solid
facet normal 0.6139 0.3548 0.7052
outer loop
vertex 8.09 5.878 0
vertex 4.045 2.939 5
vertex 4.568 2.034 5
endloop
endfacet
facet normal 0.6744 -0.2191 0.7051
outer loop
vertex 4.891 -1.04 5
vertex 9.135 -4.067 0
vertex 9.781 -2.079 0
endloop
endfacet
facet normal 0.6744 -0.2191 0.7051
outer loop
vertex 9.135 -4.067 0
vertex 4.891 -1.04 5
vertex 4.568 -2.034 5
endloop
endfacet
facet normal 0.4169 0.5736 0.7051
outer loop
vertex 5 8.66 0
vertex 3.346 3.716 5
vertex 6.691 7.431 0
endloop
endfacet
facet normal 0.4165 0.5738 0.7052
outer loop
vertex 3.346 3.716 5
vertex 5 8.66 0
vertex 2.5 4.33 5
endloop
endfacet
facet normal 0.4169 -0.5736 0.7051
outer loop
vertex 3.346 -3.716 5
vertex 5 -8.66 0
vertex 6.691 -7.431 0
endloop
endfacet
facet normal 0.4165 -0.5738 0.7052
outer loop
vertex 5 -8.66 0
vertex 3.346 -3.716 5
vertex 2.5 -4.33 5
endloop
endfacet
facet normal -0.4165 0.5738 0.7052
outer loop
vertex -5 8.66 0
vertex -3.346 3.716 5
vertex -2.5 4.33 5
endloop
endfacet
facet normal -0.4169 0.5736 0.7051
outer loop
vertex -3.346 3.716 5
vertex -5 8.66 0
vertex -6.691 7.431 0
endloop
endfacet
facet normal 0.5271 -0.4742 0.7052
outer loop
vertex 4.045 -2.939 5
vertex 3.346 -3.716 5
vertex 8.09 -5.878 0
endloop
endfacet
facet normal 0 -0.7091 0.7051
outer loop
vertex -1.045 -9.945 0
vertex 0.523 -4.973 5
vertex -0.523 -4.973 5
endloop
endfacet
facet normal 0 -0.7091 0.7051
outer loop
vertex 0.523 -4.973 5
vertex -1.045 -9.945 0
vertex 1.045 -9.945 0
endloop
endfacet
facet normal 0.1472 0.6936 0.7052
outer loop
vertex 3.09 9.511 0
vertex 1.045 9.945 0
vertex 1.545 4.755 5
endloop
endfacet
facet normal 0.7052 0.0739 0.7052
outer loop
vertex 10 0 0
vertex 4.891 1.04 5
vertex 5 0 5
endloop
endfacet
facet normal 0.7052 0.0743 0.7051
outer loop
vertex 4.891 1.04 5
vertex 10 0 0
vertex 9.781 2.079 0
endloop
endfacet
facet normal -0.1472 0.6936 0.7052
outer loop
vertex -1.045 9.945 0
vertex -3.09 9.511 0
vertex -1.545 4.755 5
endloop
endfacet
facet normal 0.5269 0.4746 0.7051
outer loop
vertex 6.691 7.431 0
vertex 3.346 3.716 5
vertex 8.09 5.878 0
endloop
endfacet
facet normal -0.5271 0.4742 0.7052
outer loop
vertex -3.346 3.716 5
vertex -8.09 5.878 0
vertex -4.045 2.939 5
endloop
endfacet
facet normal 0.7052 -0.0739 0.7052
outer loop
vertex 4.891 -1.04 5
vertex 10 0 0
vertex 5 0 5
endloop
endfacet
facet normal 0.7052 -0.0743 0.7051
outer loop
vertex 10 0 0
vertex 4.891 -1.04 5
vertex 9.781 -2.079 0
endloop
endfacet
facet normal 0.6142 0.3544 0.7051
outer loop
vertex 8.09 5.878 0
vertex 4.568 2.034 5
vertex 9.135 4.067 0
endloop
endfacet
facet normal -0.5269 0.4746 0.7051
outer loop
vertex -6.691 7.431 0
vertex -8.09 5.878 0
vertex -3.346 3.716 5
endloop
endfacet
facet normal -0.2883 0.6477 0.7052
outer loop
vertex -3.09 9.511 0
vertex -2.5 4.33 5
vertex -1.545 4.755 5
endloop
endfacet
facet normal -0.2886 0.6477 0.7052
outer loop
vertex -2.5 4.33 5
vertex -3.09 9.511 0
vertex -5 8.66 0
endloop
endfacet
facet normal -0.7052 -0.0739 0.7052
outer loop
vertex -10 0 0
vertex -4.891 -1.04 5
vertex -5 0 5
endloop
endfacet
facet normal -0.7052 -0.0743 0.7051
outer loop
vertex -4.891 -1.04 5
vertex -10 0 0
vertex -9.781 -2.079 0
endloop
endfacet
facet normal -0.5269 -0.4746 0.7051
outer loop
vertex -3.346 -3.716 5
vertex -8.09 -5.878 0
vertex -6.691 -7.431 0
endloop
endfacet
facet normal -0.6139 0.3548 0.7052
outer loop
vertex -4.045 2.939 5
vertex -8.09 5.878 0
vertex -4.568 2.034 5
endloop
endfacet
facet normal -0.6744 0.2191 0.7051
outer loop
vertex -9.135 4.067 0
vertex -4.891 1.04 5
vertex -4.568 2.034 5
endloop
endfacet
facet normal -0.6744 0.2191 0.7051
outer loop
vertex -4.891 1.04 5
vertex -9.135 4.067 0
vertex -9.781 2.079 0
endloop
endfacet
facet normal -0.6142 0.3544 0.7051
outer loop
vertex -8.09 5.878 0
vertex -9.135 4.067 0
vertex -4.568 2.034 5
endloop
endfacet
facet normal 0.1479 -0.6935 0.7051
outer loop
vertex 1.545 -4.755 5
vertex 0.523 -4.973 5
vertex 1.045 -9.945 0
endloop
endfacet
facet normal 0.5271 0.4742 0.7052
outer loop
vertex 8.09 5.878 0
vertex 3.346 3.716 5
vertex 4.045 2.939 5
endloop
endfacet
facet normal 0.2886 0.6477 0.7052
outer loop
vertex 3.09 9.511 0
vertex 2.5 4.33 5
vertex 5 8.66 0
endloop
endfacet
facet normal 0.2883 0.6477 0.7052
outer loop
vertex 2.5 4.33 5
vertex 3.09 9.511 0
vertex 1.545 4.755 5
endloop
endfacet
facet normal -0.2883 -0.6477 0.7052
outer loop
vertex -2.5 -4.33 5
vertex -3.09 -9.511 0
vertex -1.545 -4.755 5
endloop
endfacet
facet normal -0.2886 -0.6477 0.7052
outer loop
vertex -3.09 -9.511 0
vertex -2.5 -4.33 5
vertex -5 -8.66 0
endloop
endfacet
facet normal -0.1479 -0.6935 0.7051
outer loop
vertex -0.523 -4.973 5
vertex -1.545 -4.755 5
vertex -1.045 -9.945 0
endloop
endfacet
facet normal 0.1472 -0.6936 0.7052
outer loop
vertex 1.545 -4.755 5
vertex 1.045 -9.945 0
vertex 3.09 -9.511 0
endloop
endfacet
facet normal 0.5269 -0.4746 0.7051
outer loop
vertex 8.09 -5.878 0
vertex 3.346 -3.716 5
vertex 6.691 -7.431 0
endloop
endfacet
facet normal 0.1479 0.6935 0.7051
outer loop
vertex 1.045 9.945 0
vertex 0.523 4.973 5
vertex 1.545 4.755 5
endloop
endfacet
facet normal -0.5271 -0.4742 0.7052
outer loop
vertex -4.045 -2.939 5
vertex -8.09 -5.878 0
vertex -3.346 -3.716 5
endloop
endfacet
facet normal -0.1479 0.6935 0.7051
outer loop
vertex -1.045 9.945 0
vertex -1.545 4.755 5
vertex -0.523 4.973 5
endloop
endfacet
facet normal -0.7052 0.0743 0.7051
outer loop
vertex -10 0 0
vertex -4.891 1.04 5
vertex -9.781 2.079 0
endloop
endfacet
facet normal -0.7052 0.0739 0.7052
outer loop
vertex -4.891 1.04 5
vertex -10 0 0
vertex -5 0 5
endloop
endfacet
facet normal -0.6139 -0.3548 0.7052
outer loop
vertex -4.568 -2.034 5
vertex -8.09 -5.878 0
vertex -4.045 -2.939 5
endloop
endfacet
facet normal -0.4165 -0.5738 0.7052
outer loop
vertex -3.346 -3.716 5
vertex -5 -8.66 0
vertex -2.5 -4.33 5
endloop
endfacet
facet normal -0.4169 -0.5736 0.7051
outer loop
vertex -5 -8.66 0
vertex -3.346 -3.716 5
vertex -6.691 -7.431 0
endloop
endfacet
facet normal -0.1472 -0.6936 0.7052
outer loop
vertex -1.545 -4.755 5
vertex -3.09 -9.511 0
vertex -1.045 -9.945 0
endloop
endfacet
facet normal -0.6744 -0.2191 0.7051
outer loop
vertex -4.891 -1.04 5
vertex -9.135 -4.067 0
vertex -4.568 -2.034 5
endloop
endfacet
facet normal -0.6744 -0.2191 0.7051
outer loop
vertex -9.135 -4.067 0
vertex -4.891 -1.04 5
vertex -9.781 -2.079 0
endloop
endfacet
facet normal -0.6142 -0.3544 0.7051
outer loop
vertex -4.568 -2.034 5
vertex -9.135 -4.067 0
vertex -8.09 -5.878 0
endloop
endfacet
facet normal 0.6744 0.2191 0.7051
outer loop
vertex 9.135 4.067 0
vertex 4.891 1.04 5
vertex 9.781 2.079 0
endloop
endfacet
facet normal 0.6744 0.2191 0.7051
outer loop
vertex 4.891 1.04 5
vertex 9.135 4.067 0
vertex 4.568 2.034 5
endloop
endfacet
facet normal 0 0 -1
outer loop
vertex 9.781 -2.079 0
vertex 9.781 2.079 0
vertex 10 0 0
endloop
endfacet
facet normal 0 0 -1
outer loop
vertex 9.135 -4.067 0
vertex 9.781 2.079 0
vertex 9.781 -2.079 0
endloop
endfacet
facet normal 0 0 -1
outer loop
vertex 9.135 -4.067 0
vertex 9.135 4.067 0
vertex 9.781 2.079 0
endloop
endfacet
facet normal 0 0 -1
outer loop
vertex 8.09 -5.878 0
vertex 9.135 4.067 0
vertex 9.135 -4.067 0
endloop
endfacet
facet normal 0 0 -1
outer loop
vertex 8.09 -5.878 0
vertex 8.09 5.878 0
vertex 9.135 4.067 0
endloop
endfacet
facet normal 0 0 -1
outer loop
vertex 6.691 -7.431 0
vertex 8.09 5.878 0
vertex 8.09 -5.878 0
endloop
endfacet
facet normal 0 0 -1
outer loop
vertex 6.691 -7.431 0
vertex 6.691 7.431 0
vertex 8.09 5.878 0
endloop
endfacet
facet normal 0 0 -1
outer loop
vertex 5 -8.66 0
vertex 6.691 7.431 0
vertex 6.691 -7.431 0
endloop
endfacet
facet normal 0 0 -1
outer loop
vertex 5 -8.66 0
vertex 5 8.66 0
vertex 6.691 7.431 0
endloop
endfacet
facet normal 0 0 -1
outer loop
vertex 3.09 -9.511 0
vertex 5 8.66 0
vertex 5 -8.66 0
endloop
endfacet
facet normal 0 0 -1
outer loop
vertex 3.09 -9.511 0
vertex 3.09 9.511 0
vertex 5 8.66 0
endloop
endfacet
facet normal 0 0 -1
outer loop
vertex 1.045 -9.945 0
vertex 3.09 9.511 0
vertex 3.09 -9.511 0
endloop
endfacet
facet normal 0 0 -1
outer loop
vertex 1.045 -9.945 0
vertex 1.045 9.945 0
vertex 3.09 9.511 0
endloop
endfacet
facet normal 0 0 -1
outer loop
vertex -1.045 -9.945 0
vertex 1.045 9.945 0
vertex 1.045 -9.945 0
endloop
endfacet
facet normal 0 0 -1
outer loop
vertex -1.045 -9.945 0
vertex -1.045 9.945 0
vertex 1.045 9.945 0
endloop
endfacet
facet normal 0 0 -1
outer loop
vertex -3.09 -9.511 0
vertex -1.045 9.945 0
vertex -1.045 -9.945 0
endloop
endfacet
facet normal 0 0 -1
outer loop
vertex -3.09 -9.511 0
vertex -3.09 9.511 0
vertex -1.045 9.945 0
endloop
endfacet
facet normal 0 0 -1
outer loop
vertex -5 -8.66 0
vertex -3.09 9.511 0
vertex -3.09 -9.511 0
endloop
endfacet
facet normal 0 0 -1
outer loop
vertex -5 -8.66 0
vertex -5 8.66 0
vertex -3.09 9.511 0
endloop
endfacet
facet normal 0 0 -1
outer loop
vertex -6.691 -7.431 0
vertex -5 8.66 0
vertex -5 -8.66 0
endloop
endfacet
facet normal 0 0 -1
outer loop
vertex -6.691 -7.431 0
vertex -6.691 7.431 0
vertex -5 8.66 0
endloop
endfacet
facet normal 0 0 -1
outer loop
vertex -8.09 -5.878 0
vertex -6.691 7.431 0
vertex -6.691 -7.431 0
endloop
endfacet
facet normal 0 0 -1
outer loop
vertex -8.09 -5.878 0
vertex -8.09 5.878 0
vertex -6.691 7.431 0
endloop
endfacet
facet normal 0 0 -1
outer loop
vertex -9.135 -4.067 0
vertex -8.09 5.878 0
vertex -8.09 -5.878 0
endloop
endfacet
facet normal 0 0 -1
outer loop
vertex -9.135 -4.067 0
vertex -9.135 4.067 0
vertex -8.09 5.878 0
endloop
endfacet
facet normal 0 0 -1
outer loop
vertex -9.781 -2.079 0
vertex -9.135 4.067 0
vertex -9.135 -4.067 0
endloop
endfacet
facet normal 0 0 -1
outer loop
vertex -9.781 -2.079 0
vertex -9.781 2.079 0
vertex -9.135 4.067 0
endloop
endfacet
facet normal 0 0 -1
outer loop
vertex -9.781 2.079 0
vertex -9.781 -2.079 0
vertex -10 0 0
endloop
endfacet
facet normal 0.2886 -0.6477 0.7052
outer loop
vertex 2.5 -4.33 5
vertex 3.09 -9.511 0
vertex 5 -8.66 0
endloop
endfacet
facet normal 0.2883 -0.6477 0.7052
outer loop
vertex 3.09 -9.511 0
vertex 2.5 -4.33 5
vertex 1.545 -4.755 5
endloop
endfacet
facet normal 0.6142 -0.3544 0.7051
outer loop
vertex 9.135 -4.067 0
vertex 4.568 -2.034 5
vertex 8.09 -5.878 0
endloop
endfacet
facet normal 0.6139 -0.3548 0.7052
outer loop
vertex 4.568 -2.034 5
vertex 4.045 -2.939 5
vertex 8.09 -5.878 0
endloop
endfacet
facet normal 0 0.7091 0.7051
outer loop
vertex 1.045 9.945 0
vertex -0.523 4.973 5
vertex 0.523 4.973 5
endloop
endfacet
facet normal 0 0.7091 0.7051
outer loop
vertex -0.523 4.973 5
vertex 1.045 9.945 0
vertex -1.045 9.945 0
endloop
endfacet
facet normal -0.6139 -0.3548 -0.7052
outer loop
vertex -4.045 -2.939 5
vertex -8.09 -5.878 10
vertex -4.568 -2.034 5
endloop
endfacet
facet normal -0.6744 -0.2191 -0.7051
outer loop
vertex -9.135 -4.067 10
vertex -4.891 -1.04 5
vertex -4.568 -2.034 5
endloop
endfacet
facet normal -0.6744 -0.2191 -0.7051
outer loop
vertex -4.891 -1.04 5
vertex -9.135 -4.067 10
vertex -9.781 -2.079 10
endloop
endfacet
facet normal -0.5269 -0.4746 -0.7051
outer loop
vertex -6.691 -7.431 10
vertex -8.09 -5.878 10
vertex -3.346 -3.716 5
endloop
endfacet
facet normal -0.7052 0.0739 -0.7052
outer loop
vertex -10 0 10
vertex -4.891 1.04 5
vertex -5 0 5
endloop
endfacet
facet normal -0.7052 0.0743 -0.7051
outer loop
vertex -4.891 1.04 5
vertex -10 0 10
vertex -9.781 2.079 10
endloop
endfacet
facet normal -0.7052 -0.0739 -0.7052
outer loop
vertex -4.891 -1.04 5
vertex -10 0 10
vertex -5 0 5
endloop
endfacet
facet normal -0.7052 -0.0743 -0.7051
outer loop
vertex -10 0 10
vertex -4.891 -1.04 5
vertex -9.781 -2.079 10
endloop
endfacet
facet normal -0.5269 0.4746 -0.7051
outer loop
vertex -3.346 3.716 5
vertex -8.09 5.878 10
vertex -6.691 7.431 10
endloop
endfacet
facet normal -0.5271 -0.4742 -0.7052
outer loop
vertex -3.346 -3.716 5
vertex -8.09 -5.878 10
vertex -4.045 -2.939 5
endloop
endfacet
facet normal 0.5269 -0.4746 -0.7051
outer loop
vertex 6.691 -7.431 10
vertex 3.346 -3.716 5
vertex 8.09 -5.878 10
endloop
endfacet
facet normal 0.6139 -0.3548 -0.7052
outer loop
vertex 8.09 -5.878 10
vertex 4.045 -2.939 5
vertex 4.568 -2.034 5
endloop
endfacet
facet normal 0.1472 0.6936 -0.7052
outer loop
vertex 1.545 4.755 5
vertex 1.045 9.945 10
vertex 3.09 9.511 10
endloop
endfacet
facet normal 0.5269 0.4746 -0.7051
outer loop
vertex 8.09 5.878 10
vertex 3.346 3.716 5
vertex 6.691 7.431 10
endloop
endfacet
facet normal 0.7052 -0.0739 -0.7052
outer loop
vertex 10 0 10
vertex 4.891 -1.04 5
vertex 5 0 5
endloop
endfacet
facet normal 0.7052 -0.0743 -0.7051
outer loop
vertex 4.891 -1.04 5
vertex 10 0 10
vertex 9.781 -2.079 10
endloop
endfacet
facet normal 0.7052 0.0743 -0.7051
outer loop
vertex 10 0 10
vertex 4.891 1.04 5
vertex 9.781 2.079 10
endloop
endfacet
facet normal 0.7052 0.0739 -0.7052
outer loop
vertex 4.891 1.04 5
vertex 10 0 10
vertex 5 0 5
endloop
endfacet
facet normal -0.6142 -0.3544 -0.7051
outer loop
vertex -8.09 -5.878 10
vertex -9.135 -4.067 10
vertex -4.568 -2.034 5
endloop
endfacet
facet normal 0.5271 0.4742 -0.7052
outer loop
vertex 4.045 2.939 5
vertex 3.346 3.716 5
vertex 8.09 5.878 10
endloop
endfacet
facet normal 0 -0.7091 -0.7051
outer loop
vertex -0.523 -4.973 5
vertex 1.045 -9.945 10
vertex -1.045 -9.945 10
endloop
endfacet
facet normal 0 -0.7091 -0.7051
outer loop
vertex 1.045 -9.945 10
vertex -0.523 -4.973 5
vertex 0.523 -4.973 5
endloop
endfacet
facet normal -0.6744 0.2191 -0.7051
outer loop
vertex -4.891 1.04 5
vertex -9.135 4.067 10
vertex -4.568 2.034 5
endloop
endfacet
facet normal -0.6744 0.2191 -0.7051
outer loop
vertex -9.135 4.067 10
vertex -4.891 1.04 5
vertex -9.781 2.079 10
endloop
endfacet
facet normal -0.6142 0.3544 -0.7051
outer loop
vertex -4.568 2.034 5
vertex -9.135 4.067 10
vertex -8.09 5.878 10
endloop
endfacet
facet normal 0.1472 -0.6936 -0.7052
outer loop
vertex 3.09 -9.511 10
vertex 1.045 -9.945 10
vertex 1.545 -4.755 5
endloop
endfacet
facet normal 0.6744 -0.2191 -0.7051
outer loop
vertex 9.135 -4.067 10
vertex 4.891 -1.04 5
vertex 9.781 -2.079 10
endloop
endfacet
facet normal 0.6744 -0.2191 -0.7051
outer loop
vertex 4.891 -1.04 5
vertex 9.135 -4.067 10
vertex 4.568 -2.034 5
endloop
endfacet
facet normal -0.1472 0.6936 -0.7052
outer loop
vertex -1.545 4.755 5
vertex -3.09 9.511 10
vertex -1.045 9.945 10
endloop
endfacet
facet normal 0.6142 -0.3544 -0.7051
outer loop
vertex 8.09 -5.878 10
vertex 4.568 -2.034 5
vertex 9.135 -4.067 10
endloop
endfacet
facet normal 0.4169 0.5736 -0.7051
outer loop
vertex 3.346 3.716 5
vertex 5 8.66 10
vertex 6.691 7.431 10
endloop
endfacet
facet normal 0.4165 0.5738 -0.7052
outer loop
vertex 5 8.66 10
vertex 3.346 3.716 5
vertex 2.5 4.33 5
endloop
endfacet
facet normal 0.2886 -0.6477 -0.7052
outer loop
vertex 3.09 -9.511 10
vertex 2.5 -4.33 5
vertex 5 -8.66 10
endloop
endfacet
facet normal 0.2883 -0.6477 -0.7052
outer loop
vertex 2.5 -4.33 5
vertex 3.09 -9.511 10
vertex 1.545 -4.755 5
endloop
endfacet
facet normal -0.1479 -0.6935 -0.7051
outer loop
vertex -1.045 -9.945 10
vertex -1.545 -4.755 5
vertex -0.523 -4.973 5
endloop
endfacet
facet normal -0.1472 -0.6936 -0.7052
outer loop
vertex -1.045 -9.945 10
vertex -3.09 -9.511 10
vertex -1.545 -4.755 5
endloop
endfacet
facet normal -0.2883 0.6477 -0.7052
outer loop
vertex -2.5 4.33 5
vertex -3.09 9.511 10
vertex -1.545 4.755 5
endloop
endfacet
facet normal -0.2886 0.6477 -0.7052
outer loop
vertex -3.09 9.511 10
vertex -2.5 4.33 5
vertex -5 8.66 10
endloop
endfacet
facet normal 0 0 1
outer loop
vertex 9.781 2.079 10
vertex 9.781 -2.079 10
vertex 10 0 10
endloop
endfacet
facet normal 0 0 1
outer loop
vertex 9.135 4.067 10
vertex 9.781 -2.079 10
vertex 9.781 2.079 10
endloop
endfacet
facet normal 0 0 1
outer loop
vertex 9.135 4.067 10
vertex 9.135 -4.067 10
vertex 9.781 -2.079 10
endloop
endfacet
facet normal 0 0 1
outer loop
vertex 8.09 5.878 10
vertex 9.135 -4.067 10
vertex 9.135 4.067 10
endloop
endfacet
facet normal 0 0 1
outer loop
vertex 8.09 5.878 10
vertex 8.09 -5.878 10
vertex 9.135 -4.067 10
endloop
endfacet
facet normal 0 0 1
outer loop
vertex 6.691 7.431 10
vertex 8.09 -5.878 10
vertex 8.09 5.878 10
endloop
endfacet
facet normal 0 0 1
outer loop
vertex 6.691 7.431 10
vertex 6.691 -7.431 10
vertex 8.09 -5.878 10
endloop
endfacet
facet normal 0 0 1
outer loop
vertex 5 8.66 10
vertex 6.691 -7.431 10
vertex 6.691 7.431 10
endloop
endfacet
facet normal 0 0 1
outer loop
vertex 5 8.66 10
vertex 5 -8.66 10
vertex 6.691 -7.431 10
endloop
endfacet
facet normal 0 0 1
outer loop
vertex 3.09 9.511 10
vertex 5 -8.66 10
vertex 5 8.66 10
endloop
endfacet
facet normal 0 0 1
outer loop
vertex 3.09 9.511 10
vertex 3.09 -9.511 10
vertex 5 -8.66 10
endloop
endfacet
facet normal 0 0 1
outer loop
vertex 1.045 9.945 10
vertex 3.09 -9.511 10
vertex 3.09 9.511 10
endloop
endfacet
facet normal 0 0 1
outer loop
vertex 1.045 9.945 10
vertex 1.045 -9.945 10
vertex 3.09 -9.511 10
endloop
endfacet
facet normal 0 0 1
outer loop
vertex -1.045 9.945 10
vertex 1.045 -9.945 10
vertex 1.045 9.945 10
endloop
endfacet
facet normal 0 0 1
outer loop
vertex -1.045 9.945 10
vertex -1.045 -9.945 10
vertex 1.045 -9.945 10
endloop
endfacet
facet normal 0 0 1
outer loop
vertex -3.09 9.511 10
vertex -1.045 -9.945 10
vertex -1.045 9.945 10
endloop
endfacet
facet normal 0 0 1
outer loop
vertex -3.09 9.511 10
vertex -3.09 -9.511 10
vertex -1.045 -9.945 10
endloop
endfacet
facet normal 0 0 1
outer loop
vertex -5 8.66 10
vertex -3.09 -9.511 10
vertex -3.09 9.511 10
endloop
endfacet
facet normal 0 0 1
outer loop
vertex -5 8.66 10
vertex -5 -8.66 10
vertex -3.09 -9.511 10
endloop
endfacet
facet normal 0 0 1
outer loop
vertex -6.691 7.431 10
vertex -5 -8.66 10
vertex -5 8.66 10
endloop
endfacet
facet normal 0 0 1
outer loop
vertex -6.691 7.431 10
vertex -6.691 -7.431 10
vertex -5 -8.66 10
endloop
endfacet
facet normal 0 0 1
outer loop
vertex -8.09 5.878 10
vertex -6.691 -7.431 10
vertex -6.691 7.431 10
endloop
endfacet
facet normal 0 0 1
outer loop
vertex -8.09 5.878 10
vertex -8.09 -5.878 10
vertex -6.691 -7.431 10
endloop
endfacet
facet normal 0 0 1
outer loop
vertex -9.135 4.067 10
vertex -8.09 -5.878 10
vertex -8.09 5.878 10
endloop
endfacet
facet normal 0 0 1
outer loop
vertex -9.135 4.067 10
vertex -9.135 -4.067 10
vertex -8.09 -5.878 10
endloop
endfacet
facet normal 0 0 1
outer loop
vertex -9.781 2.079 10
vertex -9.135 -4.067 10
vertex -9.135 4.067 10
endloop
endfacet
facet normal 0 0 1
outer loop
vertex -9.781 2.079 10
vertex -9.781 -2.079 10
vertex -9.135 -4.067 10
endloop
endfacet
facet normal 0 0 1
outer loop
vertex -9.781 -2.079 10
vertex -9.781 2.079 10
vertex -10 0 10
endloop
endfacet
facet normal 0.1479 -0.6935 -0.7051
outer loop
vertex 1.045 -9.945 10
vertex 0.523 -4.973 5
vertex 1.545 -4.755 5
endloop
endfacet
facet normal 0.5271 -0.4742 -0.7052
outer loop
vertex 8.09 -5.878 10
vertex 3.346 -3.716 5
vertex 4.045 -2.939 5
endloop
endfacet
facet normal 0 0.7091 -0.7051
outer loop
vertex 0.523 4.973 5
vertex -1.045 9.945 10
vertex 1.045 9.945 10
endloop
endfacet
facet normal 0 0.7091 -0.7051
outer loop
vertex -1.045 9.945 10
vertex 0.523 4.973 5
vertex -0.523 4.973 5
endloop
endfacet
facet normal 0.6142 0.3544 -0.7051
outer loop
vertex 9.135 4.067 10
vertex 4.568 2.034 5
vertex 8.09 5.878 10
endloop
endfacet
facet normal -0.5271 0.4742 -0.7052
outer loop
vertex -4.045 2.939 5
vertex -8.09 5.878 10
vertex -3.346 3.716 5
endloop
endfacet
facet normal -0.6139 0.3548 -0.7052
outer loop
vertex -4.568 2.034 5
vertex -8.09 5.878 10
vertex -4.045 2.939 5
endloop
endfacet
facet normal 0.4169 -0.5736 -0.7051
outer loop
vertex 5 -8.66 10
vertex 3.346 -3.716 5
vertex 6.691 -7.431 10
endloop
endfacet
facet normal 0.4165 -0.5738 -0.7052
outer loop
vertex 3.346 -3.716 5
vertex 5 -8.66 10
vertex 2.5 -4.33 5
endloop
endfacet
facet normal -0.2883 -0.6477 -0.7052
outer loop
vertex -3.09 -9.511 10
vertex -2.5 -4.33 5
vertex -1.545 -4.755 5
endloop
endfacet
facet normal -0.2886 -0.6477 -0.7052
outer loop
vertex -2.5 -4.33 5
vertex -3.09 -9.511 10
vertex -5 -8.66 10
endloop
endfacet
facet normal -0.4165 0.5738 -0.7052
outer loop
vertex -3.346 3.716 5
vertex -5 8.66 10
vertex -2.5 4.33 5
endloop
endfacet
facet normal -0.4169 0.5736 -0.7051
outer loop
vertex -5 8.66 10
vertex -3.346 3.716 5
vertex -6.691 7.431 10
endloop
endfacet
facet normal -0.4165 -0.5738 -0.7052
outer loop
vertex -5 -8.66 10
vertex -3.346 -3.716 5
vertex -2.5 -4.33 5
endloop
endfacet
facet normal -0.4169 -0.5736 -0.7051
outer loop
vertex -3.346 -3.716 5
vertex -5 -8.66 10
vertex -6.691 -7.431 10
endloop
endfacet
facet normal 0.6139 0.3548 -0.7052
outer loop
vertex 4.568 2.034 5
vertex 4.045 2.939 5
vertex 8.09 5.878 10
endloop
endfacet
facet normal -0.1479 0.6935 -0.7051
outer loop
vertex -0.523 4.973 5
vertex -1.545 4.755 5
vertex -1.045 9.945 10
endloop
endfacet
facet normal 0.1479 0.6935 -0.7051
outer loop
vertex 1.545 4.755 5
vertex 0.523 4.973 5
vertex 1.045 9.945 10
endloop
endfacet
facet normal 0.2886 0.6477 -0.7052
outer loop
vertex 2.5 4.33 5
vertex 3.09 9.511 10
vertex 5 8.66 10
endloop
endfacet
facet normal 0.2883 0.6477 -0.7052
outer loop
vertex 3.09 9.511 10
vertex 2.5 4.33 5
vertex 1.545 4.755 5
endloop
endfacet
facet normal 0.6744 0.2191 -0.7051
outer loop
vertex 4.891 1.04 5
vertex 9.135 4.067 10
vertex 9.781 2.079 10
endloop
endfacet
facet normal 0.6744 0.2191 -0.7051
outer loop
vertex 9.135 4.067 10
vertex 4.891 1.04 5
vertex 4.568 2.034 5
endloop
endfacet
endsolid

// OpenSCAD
// Bottom Half 
cylinder(5, 10, 5);

// Top Half
translate([0,0,5]) cylinder(5, 5, 10);
